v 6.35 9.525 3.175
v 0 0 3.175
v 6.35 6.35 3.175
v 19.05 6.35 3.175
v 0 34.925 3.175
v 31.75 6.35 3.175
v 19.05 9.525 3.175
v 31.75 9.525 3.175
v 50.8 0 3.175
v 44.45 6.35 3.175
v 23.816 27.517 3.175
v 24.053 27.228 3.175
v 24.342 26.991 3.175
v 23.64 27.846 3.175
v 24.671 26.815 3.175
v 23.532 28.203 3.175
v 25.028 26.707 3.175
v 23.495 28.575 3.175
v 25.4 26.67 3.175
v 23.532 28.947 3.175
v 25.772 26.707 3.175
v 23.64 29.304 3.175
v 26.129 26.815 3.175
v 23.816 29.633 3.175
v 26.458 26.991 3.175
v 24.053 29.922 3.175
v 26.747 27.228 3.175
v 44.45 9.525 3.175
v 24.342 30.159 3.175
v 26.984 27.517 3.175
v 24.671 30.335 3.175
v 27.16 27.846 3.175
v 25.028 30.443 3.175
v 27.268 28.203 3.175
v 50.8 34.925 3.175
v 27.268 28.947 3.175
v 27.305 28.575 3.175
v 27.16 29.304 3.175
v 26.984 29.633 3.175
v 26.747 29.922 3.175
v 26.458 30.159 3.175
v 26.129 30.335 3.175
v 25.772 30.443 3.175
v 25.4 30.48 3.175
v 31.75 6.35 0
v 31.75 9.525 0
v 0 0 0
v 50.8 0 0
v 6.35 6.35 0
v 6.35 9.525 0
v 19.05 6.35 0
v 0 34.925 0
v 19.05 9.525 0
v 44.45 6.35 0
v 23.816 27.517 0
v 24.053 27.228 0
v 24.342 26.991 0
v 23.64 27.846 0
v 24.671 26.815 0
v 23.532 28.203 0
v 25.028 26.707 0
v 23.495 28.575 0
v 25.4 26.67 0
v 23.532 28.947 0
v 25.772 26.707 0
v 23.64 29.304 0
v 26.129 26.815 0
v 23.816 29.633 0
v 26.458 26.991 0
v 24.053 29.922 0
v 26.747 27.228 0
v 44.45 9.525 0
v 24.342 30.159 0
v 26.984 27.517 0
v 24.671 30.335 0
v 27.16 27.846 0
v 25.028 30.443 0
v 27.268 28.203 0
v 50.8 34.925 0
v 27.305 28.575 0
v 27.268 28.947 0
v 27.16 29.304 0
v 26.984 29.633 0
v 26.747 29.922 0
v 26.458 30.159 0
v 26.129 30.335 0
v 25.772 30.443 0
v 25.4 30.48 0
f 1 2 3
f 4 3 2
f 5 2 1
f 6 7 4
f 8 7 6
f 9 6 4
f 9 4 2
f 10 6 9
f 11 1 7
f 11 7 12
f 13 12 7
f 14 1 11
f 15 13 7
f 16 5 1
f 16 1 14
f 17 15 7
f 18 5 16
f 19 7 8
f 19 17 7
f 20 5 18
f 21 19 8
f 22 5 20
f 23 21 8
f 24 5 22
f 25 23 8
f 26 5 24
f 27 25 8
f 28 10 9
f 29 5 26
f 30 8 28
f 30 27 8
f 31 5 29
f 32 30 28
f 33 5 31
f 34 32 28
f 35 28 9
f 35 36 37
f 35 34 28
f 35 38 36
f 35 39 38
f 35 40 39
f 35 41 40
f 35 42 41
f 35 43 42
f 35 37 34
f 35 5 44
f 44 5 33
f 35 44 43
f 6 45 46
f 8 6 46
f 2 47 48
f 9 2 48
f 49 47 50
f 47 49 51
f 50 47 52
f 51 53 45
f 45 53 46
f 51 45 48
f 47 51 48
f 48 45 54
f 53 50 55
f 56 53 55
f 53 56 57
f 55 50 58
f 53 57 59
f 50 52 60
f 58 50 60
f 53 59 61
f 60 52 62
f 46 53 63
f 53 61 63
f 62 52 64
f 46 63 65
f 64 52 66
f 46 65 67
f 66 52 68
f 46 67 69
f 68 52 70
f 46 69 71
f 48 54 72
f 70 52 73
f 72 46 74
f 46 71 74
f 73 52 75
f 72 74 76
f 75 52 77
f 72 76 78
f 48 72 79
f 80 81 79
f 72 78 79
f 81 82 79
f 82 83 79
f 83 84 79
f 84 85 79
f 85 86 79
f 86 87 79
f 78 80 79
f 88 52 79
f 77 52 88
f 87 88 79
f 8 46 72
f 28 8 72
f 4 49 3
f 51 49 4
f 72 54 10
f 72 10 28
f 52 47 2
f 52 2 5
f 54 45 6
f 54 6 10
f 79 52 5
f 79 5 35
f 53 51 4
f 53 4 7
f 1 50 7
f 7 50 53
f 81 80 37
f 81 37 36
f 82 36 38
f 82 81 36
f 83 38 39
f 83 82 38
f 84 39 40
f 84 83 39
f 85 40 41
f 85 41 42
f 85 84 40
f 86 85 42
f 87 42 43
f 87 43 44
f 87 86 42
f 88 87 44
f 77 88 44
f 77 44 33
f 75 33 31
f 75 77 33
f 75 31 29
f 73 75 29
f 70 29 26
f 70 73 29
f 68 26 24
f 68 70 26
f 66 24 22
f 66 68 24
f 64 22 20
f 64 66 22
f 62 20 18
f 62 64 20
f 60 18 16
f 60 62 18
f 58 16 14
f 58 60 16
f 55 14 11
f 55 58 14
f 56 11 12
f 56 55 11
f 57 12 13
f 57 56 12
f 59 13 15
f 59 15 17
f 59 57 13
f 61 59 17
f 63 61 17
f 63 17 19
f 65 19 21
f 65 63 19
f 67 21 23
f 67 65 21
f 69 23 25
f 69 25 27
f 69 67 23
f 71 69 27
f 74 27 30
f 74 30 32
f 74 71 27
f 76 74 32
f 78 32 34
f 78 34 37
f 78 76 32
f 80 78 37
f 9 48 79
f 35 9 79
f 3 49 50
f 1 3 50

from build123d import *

# Parameters (mm, degrees)
SKETCH1_W           = 50.8
SKETCH1_H           = 34.925
SKETCH1_R           = 1.905
SKETCH1_W_2         = 12.7
SKETCH1_H_2         = 3.175
BOSS_EXTRUDE1_DEPTH = 3.175


with BuildPart() as part:
    # Sketch1 → Boss-Extrude1 (new body)
    with BuildSketch(Plane.XY):
        with Locations((25.4, 17.4625)):
            Rectangle(SKETCH1_W, SKETCH1_H)
        with Locations((25.4, 28.575)):
            Circle(SKETCH1_R, mode=Mode.SUBTRACT)
        with Locations((12.7, 7.9375)):
            Rectangle(SKETCH1_W_2, SKETCH1_H_2, mode=Mode.SUBTRACT)
        with Locations((38.1, 7.9375)):
            Rectangle(SKETCH1_W_2, SKETCH1_H_2, mode=Mode.SUBTRACT)
    extrude(amount=BOSS_EXTRUDE1_DEPTH)


solid = part.part
